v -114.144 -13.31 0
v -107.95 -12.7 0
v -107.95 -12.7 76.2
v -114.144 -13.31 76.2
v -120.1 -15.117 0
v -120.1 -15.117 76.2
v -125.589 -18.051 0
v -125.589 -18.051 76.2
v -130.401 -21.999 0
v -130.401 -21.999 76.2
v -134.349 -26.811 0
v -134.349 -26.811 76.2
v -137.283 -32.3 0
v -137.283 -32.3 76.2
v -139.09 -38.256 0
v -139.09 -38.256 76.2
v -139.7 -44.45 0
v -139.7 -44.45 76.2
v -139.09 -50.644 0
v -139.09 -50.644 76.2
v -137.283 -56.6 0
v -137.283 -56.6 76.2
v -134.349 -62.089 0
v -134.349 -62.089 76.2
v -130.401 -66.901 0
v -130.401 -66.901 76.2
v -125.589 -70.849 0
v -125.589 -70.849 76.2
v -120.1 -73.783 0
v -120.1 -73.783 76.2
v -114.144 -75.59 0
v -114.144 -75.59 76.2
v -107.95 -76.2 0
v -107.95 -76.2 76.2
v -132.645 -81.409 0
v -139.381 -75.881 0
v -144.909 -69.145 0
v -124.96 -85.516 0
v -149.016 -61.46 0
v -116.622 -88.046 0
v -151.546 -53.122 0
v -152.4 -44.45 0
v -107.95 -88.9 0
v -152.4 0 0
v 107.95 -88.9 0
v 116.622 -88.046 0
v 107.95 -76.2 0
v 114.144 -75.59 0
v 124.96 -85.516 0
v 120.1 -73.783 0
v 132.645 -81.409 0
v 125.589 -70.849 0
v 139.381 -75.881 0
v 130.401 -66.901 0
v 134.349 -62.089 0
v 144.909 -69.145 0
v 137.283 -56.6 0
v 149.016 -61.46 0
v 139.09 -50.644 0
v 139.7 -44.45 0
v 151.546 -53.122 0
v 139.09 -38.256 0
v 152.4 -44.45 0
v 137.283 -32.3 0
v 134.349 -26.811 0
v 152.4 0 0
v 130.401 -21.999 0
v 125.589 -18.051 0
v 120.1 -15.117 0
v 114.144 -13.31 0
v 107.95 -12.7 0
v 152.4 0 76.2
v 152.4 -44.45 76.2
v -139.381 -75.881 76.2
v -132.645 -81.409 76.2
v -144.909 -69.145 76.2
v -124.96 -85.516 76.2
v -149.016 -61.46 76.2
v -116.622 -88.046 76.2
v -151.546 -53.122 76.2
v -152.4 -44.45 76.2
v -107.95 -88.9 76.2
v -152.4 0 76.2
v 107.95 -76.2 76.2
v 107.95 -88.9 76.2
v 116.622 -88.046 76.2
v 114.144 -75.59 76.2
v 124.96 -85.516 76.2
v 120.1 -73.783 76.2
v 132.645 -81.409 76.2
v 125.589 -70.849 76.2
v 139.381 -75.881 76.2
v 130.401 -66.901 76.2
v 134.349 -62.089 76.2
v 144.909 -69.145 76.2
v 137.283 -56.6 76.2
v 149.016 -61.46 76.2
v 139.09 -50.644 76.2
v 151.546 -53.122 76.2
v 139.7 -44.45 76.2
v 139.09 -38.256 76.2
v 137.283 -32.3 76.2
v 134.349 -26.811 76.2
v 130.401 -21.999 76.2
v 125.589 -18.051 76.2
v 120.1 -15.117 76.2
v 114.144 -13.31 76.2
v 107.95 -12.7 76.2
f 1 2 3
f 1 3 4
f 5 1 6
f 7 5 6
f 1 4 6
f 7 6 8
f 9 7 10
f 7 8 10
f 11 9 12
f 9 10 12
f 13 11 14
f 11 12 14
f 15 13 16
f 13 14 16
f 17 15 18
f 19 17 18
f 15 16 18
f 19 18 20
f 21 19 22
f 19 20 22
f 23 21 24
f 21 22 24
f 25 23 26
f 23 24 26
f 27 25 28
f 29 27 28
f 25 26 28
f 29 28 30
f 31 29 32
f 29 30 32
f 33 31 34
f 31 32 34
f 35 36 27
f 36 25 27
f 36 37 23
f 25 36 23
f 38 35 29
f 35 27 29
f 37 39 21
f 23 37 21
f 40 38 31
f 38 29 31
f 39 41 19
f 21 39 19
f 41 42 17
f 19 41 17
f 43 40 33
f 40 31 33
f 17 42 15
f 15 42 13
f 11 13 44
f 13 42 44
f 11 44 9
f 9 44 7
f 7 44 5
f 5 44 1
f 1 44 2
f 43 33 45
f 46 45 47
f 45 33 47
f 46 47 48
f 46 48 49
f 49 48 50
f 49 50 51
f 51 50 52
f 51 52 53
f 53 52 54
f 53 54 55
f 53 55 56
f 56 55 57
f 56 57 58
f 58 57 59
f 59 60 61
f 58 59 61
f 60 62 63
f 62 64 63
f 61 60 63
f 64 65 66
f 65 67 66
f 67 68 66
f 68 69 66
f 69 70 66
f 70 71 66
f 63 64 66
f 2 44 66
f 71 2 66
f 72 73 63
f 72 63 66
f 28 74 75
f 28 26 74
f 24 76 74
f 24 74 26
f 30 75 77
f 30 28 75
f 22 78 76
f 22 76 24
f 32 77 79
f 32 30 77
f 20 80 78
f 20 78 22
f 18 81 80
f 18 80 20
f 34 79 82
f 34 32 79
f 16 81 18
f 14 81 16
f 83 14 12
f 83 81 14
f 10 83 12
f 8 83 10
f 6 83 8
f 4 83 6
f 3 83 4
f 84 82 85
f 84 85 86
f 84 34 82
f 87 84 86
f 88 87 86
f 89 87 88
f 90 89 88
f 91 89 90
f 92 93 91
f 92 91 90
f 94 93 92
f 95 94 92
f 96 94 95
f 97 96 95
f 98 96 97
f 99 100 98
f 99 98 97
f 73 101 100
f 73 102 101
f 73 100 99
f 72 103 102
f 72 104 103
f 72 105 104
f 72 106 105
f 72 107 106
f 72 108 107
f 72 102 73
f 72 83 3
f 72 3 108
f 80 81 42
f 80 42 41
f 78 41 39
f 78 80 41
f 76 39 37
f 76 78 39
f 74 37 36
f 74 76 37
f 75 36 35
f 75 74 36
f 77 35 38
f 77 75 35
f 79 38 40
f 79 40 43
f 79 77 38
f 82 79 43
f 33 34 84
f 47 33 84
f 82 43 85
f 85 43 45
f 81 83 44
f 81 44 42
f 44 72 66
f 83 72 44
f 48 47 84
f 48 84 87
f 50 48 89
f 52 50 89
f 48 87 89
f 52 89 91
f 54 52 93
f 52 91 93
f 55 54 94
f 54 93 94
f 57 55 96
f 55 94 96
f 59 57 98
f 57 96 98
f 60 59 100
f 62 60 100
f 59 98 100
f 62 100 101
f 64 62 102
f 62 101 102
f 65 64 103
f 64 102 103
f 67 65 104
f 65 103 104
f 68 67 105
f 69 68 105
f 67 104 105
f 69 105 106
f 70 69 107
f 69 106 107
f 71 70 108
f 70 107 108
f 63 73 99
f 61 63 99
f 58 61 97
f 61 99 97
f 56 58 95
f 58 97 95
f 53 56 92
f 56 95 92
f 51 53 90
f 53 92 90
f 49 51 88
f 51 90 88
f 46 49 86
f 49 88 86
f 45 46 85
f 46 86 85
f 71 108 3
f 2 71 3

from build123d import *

# Parameters (mm, degrees)
F1_DEPTH  = 76.2
F3_DEPTH  = 127
F4_DEPTH  = 127
F5_DEPTH  = 127
F6_DEPTH  = 127
F7_DEPTH  = 76.2
F8_DEPTH  = 76.2
F9_DEPTH  = 76.2
F10_DEPTH = 76.2


with BuildPart() as f1:
    # F0 (on Top) → F1 (new body)
    with BuildSketch(Plane.XY):
        Polygon((-152.4, -88.9), (0, -88.9), (152.4, -88.9), (152.4, 0), (0, 0), (-152.4, 0), align=None)
    extrude(amount=F1_DEPTH)

    # F2 (on face) → F3 (cut)
    with BuildSketch(Plane.XY.offset(76.2)):
        with BuildLine():
            Line((-152.4, -88.9), (-107.95, -88.9))
            ThreePointArc((-107.95, -88.9), (-139.380896, -75.880896), (-152.4, -44.45))
            Line((-152.4, -44.45), (-152.4, -88.9))
        make_face()
    extrude(amount=-F3_DEPTH, mode=Mode.SUBTRACT)

    # F2 (on face) → F4 (cut)
    with BuildSketch(Plane.XY.offset(76.2)):
        with BuildLine():
            ThreePointArc((-152.4, -44.45), (-139.380896, -75.880896), (-107.95, -88.9))
            Line((-107.95, -88.9), (-107.95, -76.2))
            ThreePointArc((-107.95, -76.2), (-139.7, -44.45), (-107.95, -12.7))
            Line((-107.95, -12.7), (-107.95, 0))
            Line((-107.95, 0), (-152.4, 0))
            Line((-152.4, 0), (-152.4, -44.45))
        make_face()
    extrude(amount=-F4_DEPTH, mode=Mode.SUBTRACT)

    # F2 (on face) → F5 (cut)
    with BuildSketch(Plane.XY.offset(76.2)):
        with BuildLine():
            ThreePointArc((107.95, 0), (139.380896, -13.019104), (152.4, -44.45))
            Line((152.4, -44.45), (152.4, 0))
            Line((152.4, 0), (107.95, 0))
        make_face()
    extrude(amount=-F5_DEPTH, mode=Mode.SUBTRACT)

    # F2 (on face) → F6 (cut)
    with BuildSketch(Plane.XY.offset(76.2)):
        with BuildLine():
            Line((107.95, -88.9), (152.4, -88.9))
            Line((152.4, -88.9), (152.4, -44.45))
            ThreePointArc((152.4, -44.45), (139.380896, -75.880896), (107.95, -88.9))
        make_face()
    extrude(amount=-F6_DEPTH, mode=Mode.SUBTRACT)

    # F2 (on face) → F7 (join)
    with BuildSketch(Plane.XY.offset(76.2)):
        with BuildLine():
            ThreePointArc((107.95, 0), (139.380896, -13.019104), (152.4, -44.45))
            Line((152.4, -44.45), (152.4, 0))
            Line((152.4, 0), (107.95, 0))
        make_face()
    extrude(amount=-F7_DEPTH)

    # F2 (on face) → F8 (join)
    with BuildSketch(Plane.XY.offset(76.2)):
        with BuildLine():
            ThreePointArc((-152.4, -44.45), (-139.380896, -75.880896), (-107.95, -88.9))
            Line((-107.95, -88.9), (-107.95, -76.2))
            ThreePointArc((-107.95, -76.2), (-139.7, -44.45), (-107.95, -12.7))
            Line((-107.95, -12.7), (-107.95, 0))
            Line((-107.95, 0), (-152.4, 0))
            Line((-152.4, 0), (-152.4, -44.45))
        make_face()
    extrude(amount=-F8_DEPTH)

    # F2 (on face) → F9 (cut)
    with BuildSketch(Plane.XY.offset(76.2)):
        with BuildLine():
            Line((0, -76.2), (107.95, -76.2))
            ThreePointArc((107.95, -76.2), (139.7, -44.45), (107.95, -12.7))
            Line((107.95, -12.7), (0, -12.7))
            Line((0, -12.7), (-107.95, -12.7))
            ThreePointArc((-107.95, -12.7), (-139.7, -44.45), (-107.95, -76.2))
            Line((-107.95, -76.2), (0, -76.2))
        make_face()
    extrude(amount=-F9_DEPTH, mode=Mode.SUBTRACT)

    # F2 (on face) → F10 (cut)
    with BuildSketch(Plane.XY.offset(76.2)):
        with BuildLine():
            Line((0, -76.2), (107.95, -76.2))
            ThreePointArc((107.95, -76.2), (139.7, -44.45), (107.95, -12.7))
            Line((107.95, -12.7), (0, -12.7))
            Line((0, -12.7), (-107.95, -12.7))
            ThreePointArc((-107.95, -12.7), (-139.7, -44.45), (-107.95, -76.2))
            Line((-107.95, -76.2), (0, -76.2))
        make_face()
    extrude(amount=-F10_DEPTH, mode=Mode.SUBTRACT)


solid = f1.part
